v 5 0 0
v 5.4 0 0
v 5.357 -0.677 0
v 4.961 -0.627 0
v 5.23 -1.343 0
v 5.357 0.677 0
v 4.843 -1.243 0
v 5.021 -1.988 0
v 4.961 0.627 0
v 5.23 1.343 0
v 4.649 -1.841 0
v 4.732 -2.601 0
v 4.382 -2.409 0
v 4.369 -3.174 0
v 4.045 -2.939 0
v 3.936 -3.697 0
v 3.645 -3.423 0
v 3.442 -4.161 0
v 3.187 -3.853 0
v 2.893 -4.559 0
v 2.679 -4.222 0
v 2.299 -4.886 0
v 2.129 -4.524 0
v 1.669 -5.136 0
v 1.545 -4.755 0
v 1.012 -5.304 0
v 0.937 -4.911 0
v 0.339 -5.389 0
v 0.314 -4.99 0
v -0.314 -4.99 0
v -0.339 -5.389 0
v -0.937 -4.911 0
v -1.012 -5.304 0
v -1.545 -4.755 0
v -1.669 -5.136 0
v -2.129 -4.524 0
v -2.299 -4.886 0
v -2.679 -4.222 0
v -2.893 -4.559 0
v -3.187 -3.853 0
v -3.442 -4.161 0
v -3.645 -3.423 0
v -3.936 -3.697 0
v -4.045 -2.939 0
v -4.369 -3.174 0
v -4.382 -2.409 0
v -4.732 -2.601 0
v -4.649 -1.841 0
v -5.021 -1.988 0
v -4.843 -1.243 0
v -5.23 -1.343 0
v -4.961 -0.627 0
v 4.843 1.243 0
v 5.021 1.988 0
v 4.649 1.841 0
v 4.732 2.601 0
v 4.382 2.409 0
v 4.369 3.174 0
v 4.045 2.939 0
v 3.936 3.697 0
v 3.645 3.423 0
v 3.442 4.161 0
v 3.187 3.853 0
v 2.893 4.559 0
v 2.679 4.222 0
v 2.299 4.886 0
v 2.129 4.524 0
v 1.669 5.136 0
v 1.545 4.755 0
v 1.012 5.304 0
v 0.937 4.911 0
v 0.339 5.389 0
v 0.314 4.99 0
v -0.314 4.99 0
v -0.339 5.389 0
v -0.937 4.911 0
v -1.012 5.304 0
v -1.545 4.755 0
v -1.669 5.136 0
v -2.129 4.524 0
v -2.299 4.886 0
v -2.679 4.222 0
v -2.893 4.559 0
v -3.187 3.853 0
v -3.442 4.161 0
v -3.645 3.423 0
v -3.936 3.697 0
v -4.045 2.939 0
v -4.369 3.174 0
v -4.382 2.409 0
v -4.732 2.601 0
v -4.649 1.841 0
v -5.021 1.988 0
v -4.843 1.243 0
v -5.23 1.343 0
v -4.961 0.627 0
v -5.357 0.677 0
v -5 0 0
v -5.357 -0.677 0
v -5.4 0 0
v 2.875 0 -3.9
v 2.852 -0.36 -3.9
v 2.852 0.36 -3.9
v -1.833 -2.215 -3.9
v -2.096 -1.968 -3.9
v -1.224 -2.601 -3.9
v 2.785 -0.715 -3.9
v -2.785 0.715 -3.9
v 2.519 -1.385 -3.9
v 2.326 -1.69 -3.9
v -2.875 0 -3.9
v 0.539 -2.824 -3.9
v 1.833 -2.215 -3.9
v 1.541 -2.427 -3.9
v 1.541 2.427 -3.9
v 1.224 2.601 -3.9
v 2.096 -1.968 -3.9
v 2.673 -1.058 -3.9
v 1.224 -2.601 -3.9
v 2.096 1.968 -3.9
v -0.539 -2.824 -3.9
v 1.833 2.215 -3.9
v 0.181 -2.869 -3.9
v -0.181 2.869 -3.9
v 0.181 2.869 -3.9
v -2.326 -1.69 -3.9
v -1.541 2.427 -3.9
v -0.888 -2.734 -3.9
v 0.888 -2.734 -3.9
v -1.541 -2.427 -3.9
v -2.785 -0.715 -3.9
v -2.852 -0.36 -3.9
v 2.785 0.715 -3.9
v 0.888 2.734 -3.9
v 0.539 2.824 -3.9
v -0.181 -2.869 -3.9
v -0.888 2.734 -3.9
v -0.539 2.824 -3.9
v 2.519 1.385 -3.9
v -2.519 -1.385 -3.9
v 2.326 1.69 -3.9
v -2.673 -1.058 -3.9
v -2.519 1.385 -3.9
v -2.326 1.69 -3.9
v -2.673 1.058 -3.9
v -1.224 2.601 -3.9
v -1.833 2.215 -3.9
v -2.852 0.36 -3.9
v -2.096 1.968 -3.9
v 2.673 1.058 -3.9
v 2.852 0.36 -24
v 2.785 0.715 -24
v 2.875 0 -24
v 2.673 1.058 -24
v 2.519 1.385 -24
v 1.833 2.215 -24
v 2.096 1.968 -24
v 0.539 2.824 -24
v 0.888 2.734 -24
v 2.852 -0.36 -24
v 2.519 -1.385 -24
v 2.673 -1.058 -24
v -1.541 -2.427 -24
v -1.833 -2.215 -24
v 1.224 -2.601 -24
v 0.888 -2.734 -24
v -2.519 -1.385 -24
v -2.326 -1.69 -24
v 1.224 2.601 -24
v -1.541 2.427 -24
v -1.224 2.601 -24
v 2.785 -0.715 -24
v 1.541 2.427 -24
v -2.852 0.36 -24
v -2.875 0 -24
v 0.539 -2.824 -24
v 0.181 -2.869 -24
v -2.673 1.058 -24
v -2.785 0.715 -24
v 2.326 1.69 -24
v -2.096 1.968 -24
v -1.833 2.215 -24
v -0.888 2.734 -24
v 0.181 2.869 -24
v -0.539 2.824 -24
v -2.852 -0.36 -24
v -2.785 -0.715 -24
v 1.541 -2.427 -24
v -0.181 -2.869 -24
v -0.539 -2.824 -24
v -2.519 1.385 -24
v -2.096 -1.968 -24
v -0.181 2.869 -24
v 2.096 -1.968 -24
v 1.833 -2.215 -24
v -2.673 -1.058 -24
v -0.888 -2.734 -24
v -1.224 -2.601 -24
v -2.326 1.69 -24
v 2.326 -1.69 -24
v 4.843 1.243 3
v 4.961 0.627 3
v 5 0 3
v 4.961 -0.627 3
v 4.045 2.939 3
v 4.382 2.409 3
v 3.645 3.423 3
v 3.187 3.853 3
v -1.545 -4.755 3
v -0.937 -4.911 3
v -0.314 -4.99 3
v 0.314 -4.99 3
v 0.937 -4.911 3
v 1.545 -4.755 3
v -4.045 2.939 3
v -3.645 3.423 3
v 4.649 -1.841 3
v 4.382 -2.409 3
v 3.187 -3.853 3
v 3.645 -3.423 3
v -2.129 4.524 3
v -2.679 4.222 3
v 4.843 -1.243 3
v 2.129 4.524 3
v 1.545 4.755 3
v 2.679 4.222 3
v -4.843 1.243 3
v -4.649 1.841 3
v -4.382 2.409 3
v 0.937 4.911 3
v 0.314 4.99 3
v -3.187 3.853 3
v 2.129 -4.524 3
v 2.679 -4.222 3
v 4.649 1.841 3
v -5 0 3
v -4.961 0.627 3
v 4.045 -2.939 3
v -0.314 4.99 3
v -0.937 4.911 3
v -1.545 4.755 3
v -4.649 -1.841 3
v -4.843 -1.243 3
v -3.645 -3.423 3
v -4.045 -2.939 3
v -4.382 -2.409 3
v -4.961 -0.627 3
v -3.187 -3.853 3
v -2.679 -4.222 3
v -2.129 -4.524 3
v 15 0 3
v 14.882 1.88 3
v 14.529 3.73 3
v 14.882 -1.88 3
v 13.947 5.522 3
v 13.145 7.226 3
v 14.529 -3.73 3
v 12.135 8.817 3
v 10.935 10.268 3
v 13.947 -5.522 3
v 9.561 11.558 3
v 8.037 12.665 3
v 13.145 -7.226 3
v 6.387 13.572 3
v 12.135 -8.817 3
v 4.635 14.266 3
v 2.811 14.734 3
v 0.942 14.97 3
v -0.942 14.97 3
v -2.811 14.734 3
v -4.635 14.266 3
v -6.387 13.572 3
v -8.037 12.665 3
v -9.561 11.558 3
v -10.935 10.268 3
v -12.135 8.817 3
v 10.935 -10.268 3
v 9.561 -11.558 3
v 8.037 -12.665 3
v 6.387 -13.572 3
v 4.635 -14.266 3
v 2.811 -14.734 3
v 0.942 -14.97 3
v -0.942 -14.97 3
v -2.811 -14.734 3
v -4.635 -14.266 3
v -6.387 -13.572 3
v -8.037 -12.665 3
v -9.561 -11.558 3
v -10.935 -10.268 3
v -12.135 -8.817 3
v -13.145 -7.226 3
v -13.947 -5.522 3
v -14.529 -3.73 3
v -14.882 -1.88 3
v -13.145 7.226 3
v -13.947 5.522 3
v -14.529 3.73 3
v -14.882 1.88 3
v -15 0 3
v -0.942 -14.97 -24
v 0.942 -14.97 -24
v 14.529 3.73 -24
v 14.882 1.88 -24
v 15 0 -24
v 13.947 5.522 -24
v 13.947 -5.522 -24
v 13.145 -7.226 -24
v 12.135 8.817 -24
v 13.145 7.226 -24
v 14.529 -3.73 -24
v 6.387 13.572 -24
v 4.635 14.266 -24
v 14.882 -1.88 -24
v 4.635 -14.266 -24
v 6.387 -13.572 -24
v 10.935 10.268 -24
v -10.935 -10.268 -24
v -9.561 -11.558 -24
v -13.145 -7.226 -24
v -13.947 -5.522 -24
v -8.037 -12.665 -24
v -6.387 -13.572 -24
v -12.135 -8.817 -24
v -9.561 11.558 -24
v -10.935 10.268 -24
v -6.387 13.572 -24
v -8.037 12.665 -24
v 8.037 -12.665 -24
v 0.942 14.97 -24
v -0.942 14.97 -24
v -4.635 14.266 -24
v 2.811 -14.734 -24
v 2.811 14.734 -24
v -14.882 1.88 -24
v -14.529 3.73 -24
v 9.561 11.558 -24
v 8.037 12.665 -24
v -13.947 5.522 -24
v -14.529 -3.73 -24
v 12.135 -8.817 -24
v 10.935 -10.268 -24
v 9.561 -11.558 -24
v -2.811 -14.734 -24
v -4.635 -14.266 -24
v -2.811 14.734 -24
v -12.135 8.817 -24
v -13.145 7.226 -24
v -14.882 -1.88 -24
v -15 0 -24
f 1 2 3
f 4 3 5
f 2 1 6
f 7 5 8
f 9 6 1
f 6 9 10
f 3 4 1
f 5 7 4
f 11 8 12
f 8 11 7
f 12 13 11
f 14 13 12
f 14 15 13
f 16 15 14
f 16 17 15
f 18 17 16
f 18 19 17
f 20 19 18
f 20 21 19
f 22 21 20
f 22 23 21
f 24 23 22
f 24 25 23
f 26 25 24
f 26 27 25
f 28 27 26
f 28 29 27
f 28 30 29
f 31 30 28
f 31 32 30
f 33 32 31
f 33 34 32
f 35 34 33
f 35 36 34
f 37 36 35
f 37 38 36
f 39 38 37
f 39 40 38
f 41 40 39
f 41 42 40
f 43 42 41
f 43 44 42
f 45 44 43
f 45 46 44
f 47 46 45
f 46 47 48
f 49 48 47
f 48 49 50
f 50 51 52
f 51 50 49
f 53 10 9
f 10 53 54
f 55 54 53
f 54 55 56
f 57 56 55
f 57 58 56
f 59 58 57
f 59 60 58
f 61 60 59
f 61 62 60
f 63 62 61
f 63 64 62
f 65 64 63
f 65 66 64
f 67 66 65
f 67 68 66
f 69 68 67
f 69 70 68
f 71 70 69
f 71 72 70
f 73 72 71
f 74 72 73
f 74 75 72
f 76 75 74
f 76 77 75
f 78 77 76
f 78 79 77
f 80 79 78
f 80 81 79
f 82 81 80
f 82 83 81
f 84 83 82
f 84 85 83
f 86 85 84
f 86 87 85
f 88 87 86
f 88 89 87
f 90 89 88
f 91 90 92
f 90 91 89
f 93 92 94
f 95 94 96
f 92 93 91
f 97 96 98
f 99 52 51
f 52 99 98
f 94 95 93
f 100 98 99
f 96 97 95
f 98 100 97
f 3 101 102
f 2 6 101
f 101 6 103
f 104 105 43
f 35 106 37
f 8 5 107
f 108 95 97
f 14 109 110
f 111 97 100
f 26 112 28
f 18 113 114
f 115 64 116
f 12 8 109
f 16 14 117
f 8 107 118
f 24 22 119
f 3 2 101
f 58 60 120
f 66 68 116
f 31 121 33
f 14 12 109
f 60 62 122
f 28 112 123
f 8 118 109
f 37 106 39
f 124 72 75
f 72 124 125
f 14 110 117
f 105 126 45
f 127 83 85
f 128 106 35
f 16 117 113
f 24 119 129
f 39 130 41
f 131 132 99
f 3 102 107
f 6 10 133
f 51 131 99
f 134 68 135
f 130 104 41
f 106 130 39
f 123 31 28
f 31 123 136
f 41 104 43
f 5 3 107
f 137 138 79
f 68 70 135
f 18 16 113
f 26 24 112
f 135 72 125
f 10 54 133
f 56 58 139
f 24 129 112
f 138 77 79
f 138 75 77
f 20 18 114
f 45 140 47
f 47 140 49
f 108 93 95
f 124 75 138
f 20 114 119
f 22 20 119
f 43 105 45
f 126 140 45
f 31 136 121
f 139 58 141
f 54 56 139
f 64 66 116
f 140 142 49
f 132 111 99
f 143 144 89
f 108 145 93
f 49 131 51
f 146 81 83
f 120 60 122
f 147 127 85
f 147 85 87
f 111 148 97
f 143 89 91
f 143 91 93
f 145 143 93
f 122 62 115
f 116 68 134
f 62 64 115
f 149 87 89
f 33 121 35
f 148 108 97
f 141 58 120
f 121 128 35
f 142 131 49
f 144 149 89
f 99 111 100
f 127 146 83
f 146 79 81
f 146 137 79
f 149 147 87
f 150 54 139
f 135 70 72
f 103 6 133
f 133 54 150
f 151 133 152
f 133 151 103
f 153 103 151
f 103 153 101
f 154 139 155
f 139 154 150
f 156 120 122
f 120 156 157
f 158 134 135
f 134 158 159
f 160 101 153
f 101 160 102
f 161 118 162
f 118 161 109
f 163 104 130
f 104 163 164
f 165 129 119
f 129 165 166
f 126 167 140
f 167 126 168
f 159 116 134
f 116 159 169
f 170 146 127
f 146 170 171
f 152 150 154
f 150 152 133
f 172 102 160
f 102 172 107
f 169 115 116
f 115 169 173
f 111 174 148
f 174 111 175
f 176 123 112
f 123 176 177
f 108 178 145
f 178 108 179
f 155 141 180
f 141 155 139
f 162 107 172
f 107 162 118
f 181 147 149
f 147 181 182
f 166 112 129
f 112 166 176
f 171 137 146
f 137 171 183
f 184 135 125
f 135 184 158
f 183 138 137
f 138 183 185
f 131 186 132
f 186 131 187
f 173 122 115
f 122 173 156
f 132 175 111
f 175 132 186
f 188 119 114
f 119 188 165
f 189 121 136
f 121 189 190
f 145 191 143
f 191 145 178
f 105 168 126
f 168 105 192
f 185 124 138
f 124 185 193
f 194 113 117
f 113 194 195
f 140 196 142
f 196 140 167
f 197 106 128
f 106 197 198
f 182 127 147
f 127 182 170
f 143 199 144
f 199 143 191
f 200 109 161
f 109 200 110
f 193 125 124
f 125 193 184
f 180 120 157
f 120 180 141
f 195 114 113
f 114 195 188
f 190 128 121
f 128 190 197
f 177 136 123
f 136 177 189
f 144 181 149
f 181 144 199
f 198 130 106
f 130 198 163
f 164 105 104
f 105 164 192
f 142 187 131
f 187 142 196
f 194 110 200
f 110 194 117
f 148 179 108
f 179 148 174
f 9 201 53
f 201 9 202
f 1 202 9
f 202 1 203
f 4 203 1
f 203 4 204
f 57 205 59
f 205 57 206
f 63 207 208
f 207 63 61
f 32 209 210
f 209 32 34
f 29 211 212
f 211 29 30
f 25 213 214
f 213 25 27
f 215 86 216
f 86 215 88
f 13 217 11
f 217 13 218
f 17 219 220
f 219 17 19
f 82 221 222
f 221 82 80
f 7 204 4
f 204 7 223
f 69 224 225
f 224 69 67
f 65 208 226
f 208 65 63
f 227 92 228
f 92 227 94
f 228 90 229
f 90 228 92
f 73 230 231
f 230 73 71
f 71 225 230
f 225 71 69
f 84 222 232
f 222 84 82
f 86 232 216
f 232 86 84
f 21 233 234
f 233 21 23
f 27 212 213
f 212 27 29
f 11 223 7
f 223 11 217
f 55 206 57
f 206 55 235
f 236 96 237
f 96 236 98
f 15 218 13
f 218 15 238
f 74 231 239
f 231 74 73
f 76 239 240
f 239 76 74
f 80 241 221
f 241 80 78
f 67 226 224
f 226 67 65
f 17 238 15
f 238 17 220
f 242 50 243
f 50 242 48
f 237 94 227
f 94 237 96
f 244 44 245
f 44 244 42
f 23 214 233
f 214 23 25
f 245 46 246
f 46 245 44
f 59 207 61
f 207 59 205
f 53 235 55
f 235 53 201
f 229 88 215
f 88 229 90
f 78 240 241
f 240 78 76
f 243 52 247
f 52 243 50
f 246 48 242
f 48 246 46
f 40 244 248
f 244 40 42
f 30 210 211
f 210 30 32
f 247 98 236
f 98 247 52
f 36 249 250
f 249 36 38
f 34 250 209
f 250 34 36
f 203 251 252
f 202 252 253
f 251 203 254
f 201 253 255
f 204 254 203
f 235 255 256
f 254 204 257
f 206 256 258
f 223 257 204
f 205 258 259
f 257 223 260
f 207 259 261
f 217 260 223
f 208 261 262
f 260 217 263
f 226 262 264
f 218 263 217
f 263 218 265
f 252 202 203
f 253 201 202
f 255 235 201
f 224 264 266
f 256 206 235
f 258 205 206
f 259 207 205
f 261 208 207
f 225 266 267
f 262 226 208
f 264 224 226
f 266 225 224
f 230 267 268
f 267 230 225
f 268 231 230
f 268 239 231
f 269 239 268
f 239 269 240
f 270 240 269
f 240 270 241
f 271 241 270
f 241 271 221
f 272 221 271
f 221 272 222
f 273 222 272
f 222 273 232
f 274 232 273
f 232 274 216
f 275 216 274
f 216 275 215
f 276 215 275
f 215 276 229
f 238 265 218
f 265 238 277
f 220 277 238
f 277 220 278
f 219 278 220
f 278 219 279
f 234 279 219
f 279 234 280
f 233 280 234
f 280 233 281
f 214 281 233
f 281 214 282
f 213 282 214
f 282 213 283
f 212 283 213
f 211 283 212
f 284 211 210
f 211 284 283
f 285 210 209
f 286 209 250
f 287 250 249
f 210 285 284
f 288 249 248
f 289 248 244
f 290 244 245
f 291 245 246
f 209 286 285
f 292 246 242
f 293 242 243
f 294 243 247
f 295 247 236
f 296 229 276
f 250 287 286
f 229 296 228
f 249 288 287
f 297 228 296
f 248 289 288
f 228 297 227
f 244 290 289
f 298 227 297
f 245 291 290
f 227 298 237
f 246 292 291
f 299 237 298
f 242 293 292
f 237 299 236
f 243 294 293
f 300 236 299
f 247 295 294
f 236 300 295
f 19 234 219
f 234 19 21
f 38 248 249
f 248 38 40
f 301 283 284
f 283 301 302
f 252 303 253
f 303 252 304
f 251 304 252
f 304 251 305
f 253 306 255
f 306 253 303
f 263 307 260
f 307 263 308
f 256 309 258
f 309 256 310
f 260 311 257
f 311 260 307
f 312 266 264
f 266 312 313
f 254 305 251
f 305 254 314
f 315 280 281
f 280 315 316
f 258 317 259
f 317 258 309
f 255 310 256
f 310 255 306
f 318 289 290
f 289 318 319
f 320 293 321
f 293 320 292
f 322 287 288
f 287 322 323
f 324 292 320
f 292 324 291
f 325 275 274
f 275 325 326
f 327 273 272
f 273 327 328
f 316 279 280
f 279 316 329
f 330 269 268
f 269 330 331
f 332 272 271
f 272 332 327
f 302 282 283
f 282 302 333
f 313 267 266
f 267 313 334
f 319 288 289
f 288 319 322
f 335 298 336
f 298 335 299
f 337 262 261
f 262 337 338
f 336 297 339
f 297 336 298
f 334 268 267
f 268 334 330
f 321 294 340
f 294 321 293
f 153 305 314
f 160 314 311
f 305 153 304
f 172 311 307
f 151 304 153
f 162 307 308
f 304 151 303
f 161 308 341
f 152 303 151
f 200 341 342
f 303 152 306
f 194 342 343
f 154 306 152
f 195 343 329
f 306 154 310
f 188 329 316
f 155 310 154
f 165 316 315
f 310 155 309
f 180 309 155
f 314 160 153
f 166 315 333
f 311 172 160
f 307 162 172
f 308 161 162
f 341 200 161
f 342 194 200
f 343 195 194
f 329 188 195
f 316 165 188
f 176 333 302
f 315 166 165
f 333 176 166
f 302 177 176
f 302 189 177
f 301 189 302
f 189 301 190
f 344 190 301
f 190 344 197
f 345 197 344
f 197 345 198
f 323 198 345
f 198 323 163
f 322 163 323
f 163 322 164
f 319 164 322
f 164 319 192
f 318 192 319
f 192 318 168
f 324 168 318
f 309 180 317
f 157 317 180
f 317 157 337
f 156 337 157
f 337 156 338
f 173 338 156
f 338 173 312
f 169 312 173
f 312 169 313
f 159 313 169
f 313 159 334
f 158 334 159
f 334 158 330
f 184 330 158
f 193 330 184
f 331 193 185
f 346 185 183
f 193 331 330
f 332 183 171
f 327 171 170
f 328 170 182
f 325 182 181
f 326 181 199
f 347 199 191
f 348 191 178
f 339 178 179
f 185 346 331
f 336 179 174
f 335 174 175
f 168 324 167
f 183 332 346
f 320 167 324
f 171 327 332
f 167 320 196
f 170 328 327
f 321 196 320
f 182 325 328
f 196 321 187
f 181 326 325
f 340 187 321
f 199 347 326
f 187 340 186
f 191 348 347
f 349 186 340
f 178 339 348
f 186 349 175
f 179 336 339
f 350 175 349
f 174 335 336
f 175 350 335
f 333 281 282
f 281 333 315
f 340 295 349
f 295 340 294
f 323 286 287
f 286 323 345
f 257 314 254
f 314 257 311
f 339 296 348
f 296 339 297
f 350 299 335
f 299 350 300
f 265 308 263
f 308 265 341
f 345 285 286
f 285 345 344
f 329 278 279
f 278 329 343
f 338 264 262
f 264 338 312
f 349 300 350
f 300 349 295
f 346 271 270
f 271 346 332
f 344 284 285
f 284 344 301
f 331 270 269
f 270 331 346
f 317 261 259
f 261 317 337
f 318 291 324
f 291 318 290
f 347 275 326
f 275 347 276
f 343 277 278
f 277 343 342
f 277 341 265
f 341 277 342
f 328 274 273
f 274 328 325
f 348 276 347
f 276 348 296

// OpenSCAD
$fn = 50;

difference() {
	union() {
		translate(v = [0, 0, -24.0]) {
			cylinder(h = 27, r = 15.0);
		}
	}
	union() {
		translate(v = [0, 0, 0]) {
			rotate(a = [0, 0, 0]) {
				difference() {
					union() {
						translate(v = [0, 0, -27.0]) {
							cylinder(h = 27, r = 2.6);
						}
						translate(v = [0, 0, -3.9]) {
							cylinder(h = 3.9, r1 = 2.875, r2 = 5.4);
						}
						translate(v = [0, 0, -27.0]) {
							cylinder(h = 27, r = 2.875);
						}
						translate(v = [0, 0, -27.0]) {
							cylinder(h = 27, r = 2.6);
						}
					}
					union();
				}
			}
		}
		#cylinder(h = 3, r = 5.0);
	}
}
